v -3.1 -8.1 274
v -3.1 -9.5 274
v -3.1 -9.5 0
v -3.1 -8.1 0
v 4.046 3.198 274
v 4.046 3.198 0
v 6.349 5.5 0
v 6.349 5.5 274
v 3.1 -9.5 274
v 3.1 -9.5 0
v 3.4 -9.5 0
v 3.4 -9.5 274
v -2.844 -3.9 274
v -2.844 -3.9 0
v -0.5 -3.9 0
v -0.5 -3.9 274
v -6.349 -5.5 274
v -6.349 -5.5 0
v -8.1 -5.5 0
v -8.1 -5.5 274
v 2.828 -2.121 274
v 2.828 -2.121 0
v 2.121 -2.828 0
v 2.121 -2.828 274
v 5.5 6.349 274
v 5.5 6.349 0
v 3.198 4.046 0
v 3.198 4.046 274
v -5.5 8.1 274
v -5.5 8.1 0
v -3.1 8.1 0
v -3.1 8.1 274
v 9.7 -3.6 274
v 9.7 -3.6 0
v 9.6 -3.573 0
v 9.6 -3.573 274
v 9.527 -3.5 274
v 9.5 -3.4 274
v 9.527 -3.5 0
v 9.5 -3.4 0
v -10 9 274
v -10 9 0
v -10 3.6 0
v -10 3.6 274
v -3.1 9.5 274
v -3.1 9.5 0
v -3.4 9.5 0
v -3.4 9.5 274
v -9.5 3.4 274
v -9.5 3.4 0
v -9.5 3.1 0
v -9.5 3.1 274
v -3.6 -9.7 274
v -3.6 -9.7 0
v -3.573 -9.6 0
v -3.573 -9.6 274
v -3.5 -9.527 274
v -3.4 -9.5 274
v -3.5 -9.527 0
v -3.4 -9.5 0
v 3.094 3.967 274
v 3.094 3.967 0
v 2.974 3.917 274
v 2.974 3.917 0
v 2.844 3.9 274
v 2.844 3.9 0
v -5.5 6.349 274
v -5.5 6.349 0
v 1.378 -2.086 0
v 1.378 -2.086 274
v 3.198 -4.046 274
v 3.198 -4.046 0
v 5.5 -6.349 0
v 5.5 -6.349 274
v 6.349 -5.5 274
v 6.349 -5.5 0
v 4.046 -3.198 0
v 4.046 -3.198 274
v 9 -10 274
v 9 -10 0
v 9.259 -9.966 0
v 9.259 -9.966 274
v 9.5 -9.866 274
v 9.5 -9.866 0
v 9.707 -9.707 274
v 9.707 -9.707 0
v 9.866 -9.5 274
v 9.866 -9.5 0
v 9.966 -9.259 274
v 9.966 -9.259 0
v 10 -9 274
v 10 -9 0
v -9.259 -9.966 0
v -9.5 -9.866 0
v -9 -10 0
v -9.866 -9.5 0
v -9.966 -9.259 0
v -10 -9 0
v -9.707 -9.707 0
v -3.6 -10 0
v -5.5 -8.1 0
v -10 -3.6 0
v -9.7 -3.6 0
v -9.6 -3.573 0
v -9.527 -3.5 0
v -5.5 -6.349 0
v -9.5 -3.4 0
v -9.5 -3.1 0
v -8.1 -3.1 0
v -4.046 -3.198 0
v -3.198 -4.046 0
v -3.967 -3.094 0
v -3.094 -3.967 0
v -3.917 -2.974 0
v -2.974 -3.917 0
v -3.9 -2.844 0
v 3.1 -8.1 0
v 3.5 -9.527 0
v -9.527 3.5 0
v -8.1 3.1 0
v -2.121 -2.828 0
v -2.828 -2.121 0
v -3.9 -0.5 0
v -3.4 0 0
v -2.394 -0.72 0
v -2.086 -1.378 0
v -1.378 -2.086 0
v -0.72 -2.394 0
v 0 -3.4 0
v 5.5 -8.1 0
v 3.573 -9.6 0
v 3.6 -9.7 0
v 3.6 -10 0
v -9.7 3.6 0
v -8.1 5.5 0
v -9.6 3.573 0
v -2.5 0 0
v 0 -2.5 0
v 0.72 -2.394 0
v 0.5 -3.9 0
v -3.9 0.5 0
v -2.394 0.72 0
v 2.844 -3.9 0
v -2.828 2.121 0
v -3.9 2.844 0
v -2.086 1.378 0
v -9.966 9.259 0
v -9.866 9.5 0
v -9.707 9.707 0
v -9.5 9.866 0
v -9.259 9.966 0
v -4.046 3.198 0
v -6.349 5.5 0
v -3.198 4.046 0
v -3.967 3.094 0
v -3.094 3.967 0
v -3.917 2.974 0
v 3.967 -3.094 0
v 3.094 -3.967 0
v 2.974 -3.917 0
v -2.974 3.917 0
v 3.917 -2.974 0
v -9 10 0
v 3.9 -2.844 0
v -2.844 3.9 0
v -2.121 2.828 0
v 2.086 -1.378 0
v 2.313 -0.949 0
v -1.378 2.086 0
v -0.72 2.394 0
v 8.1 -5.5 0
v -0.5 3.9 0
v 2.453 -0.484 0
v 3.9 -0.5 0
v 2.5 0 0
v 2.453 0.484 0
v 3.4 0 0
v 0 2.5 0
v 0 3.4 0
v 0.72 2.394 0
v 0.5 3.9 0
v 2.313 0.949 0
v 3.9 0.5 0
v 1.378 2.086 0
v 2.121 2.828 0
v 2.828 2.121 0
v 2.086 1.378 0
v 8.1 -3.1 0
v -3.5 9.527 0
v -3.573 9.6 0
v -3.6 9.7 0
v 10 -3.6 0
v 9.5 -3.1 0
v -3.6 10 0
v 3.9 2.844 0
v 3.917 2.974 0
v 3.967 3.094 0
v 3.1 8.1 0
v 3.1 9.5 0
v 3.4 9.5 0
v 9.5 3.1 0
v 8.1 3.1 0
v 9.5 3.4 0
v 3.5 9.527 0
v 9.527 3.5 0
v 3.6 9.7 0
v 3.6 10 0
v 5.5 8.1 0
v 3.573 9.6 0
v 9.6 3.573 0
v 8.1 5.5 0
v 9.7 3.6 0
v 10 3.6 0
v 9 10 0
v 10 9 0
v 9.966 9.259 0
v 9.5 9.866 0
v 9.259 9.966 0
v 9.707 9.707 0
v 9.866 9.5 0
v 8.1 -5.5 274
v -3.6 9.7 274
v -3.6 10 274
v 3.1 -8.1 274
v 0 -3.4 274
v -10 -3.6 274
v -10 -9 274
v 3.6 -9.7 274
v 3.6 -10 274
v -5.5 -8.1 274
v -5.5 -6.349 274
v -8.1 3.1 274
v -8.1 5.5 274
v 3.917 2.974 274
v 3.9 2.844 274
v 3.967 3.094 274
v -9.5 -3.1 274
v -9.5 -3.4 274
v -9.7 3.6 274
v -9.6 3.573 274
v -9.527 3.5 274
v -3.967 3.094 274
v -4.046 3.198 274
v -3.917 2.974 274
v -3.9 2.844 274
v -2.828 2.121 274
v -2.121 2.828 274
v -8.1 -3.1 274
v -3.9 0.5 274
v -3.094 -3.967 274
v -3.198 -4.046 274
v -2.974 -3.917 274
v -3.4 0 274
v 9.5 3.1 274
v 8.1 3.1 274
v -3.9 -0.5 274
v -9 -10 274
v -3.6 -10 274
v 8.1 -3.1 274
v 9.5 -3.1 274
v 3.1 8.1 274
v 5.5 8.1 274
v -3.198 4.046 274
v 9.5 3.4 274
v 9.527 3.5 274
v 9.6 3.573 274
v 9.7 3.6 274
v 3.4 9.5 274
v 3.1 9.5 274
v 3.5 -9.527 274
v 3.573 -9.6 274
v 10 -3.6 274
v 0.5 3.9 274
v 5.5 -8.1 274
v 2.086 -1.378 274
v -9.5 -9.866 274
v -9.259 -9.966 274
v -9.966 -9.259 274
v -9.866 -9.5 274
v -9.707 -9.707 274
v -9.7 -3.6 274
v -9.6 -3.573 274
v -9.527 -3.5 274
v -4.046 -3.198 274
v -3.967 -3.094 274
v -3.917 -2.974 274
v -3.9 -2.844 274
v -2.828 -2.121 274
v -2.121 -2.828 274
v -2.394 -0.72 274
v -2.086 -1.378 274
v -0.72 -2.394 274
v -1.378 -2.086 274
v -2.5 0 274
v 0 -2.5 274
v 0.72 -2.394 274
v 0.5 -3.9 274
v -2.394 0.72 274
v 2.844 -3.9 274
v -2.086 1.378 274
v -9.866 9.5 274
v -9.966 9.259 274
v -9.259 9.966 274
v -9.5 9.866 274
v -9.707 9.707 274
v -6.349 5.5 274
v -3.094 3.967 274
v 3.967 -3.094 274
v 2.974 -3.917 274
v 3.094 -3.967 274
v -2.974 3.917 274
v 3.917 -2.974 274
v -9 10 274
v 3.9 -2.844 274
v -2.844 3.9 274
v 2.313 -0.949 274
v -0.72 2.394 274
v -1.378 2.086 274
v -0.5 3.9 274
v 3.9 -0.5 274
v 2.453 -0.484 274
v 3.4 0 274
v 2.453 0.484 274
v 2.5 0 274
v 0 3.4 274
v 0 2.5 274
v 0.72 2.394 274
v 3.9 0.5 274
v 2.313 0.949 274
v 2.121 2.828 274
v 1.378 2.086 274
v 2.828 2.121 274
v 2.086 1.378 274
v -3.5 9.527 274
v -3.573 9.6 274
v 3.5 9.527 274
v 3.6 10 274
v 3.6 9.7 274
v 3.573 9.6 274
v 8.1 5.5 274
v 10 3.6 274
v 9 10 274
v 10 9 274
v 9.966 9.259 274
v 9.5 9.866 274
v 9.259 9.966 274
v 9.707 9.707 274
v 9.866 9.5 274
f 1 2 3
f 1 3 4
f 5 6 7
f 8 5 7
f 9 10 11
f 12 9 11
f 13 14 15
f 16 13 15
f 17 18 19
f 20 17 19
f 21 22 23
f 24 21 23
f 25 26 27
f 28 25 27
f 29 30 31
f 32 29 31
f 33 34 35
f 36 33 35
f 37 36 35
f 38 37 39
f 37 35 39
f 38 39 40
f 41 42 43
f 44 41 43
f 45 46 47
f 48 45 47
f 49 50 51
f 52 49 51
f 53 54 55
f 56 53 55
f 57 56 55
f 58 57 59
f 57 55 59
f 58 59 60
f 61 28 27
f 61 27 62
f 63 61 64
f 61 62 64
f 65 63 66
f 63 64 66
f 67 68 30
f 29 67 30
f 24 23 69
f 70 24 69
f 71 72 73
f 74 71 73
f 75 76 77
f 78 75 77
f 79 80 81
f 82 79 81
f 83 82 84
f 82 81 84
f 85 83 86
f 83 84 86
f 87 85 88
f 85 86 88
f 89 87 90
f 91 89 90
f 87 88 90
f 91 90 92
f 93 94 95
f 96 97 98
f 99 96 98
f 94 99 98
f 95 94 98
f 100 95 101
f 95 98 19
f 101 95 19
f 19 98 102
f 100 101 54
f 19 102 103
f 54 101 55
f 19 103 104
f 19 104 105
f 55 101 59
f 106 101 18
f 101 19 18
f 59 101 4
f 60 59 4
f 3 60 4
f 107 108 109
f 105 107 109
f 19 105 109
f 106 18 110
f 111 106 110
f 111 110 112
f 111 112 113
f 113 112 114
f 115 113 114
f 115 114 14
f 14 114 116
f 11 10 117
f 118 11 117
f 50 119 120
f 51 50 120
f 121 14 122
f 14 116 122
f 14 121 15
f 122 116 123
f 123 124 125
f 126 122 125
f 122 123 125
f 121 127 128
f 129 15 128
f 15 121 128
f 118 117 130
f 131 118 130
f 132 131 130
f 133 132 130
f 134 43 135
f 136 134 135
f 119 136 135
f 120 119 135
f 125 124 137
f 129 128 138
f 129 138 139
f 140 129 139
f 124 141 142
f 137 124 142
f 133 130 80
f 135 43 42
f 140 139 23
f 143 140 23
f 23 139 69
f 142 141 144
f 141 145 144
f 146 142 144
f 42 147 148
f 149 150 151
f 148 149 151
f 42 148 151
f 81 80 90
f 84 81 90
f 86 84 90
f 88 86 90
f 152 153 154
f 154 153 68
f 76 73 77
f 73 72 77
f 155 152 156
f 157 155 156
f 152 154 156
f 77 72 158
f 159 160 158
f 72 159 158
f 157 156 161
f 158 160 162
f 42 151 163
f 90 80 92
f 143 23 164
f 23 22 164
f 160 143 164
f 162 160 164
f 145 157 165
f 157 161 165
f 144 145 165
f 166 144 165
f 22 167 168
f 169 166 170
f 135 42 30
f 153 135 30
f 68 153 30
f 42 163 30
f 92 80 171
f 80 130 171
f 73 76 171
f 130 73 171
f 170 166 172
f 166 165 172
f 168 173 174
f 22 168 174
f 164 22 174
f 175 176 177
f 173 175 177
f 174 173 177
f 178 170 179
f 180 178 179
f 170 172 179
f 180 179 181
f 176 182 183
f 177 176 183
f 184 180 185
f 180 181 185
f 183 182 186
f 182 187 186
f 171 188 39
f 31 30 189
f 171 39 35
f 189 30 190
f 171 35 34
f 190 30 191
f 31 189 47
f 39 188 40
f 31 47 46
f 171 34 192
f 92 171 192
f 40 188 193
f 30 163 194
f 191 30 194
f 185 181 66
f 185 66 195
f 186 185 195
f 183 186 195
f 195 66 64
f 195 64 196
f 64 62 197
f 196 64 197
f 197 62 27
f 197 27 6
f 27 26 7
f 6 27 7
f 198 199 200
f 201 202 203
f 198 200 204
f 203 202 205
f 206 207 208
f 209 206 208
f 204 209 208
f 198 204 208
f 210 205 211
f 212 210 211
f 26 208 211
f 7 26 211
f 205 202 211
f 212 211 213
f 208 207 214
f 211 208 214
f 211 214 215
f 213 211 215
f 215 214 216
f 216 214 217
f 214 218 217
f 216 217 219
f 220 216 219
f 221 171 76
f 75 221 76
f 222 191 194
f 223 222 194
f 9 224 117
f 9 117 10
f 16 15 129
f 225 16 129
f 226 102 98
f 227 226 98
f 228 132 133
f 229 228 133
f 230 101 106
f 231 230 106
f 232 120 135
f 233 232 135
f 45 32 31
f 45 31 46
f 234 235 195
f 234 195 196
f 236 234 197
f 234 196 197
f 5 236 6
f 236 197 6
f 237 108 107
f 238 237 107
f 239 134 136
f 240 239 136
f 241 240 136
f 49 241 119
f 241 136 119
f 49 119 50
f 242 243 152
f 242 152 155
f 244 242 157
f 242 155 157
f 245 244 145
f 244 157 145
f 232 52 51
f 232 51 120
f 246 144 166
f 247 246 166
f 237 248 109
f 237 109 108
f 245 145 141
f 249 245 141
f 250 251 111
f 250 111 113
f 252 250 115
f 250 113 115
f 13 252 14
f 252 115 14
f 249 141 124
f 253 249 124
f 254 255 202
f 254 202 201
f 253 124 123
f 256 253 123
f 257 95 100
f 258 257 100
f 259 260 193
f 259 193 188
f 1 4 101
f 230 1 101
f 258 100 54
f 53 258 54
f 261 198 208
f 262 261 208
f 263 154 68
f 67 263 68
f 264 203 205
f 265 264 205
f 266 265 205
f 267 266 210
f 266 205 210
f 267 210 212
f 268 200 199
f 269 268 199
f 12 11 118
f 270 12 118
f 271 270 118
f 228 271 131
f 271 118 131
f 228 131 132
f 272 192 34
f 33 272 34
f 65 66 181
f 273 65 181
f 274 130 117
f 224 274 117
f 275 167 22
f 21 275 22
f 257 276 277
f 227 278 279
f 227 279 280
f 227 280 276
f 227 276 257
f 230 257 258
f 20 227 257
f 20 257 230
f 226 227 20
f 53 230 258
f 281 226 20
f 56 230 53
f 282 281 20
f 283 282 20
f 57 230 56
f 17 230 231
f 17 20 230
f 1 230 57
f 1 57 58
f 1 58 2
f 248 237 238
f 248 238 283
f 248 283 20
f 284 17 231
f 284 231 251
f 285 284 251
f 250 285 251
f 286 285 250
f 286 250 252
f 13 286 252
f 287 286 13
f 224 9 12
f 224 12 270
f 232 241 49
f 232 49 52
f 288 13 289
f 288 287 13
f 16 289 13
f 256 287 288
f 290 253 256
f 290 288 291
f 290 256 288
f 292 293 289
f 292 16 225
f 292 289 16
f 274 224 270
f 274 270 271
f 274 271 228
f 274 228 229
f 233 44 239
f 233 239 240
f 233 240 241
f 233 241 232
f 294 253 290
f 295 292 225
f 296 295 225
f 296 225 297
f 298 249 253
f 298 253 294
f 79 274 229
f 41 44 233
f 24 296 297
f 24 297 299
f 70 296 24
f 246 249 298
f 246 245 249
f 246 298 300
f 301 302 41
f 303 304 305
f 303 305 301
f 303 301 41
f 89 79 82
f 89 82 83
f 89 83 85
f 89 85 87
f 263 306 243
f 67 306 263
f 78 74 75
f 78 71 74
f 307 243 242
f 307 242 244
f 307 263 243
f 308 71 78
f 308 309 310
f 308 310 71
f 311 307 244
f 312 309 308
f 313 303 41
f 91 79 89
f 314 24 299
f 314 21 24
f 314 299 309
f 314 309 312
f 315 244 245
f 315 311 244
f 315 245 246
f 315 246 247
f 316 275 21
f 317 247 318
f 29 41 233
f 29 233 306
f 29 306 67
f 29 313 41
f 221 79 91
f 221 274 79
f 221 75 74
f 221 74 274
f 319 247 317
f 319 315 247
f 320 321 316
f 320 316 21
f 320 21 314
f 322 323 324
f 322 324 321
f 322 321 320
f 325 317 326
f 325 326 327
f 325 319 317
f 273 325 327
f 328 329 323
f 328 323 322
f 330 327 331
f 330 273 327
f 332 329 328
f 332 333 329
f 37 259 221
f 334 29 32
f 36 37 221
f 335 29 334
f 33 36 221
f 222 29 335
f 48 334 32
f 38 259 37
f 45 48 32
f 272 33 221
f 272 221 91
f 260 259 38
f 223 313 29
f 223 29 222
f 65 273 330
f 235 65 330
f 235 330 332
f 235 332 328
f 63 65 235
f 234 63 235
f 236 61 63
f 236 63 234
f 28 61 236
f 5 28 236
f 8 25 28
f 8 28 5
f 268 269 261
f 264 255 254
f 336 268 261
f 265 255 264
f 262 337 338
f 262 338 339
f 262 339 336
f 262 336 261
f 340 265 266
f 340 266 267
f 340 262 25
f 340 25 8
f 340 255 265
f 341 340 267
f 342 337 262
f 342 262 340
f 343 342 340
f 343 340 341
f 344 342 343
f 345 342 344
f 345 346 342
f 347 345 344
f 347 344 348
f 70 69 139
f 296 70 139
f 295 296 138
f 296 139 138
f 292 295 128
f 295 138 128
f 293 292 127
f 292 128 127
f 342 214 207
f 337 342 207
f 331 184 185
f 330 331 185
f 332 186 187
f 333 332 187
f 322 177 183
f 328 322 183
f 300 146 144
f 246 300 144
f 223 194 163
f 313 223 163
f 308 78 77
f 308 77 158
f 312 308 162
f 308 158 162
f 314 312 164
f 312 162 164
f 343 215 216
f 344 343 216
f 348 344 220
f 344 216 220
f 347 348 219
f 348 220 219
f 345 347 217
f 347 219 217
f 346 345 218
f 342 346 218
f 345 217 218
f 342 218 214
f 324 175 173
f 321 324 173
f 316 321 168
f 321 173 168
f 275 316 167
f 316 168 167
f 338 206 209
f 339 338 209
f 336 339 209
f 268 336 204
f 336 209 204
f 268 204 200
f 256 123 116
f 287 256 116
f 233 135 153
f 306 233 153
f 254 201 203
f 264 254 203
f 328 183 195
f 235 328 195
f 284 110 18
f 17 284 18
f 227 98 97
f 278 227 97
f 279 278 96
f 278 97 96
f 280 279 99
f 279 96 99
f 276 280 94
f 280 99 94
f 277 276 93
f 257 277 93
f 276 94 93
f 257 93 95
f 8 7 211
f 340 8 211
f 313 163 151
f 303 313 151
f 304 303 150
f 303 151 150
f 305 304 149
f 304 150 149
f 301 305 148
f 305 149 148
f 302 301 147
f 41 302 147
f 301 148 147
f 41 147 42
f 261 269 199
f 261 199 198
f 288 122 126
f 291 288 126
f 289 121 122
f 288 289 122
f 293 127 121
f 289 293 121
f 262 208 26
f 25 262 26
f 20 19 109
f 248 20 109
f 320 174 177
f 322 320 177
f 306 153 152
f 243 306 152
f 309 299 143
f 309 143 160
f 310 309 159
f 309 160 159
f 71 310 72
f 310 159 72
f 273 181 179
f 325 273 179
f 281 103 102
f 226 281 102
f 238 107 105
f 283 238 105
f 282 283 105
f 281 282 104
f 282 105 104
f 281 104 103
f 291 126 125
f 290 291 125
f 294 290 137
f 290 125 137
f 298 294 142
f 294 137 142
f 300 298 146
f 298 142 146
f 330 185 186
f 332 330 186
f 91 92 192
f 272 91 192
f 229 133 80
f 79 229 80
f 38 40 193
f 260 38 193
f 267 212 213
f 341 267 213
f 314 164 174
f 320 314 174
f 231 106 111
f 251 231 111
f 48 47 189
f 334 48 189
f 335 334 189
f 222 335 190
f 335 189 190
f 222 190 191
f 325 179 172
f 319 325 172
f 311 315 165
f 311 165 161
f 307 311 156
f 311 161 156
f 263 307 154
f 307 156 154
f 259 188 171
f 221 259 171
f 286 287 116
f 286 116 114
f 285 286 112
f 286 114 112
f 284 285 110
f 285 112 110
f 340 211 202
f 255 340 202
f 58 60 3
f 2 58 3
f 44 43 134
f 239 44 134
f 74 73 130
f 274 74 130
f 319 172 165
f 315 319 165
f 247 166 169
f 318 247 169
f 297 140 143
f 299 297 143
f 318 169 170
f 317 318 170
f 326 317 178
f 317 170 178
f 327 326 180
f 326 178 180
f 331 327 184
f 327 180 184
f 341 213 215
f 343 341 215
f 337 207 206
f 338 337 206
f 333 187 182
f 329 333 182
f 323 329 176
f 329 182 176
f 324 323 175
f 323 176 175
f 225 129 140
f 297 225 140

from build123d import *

# Parameters (mm, degrees)
EXTRUDE1_DEPTH = 274


with BuildPart() as part:
    # Sketch1 → Extrude1 (new body)
    with BuildSketch(Plane.XY):
        with BuildLine():
            Line((0, 3.4), (-0.5, 3.9))
            Line((-0.5, 3.9), (-2.844365081, 3.9))
            ThreePointArc((-2.844365081, 3.9), (-3.035706798, 3.938060234), (-3.197918472, 4.046446609))
            Line((-3.197918472, 4.046446609), (-5.5, 6.348528137))
            Line((-5.5, 6.348528137), (-5.5, 8.1))
            Line((-5.5, 8.1), (-3.1, 8.1))
            Line((-3.1, 8.1), (-3.1, 9.5))
            Line((-3.1, 9.5), (-3.4, 9.5))
            ThreePointArc((-3.4, 9.5), (-3.541421356, 9.558578644), (-3.6, 9.7))
            Line((-3.6, 9.7), (-3.6, 10))
            Line((-3.6, 10), (-9, 10))
            ThreePointArc((-9, 10), (-9.707106781, 9.707106781), (-10, 9))
            Line((-10, 9), (-10, 3.6))
            Line((-10, 3.6), (-9.7, 3.6))
            ThreePointArc((-9.7, 3.6), (-9.558578644, 3.541421356), (-9.5, 3.4))
            Line((-9.5, 3.4), (-9.5, 3.1))
            Line((-9.5, 3.1), (-8.1, 3.1))
            Line((-8.1, 3.1), (-8.1, 5.5))
            Line((-8.1, 5.5), (-6.348528137, 5.5))
            Line((-6.348528137, 5.5), (-4.046446609, 3.197918472))
            ThreePointArc((-4.046446609, 3.197918472), (-3.938060234, 3.035706798), (-3.9, 2.844365081))
            Line((-3.9, 2.844365081), (-3.9, 0.5))
            Line((-3.9, 0.5), (-3.4, 0))
            Line((-3.4, 0), (-3.9, -0.5))
            Line((-3.9, -0.5), (-3.9, -2.844365081))
            ThreePointArc((-3.9, -2.844365081), (-3.938060234, -3.035706798), (-4.046446609, -3.197918472))
            Line((-4.046446609, -3.197918472), (-6.348528137, -5.5))
            Line((-6.348528137, -5.5), (-8.1, -5.5))
            Line((-8.1, -5.5), (-8.1, -3.1))
            Line((-8.1, -3.1), (-9.5, -3.1))
            Line((-9.5, -3.1), (-9.5, -3.4))
            ThreePointArc((-9.5, -3.4), (-9.558578644, -3.541421356), (-9.7, -3.6))
            Line((-9.7, -3.6), (-10, -3.6))
            Line((-10, -3.6), (-10, -9))
            ThreePointArc((-10, -9), (-9.707106781, -9.707106781), (-9, -10))
            Line((-9, -10), (-3.6, -10))
            Line((-3.6, -10), (-3.6, -9.7))
            ThreePointArc((-3.6, -9.7), (-3.541421356, -9.558578644), (-3.4, -9.5))
            Line((-3.4, -9.5), (-3.1, -9.5))
            Line((-3.1, -9.5), (-3.1, -8.1))
            Line((-3.1, -8.1), (-5.5, -8.1))
            Line((-5.5, -8.1), (-5.5, -6.348528137))
            Line((-5.5, -6.348528137), (-3.197918472, -4.046446609))
            ThreePointArc((-3.197918472, -4.046446609), (-3.035706798, -3.938060234), (-2.844365081, -3.9))
            Line((-2.844365081, -3.9), (-0.5, -3.9))
            Line((-0.5, -3.9), (0, -3.4))
            Line((0, -3.4), (0.5, -3.9))
            Line((0.5, -3.9), (2.844365081, -3.9))
            ThreePointArc((2.844365081, -3.9), (3.035706798, -3.938060234), (3.197918472, -4.046446609))
            Line((3.197918472, -4.046446609), (5.5, -6.348528137))
            Line((5.5, -6.348528137), (5.5, -8.1))
            Line((5.5, -8.1), (3.1, -8.1))
            Line((3.1, -8.1), (3.1, -9.5))
            Line((3.1, -9.5), (3.4, -9.5))
            ThreePointArc((3.4, -9.5), (3.541421356, -9.558578644), (3.6, -9.7))
            Line((3.6, -9.7), (3.6, -10))
            Line((3.6, -10), (9, -10))
            ThreePointArc((9, -10), (9.707106781, -9.707106781), (10, -9))
            Line((10, -9), (10, -3.6))
            Line((10, -3.6), (9.7, -3.6))
            ThreePointArc((9.7, -3.6), (9.558578644, -3.541421356), (9.5, -3.4))
            Line((9.5, -3.4), (9.5, -3.1))
            Line((9.5, -3.1), (8.1, -3.1))
            Line((8.1, -3.1), (8.1, -5.5))
            Line((8.1, -5.5), (6.348528137, -5.5))
            Line((6.348528137, -5.5), (4.046446609, -3.197918472))
            ThreePointArc((4.046446609, -3.197918472), (3.938060234, -3.035706798), (3.9, -2.844365081))
            Line((3.9, -2.844365081), (3.9, -0.5))
            Line((3.9, -0.5), (3.4, 0))
            Line((3.4, 0), (3.9, 0.5))
            Line((3.9, 0.5), (3.9, 2.844365081))
            ThreePointArc((3.9, 2.844365081), (3.938060234, 3.035706798), (4.046446609, 3.197918472))
            Line((4.046446609, 3.197918472), (6.348528137, 5.5))
            Line((6.348528137, 5.5), (8.1, 5.5))
            Line((8.1, 5.5), (8.1, 3.1))
            Line((8.1, 3.1), (9.5, 3.1))
            Line((9.5, 3.1), (9.5, 3.4))
            ThreePointArc((9.5, 3.4), (9.558578644, 3.541421356), (9.7, 3.6))
            Line((9.7, 3.6), (10, 3.6))
            Line((10, 3.6), (10, 9))
            ThreePointArc((10, 9), (9.707106781, 9.707106781), (9, 10))
            Line((9, 10), (3.6, 10))
            Line((3.6, 10), (3.6, 9.7))
            ThreePointArc((3.6, 9.7), (3.541421356, 9.558578644), (3.4, 9.5))
            Line((3.4, 9.5), (3.1, 9.5))
            Line((3.1, 9.5), (3.1, 8.1))
            Line((3.1, 8.1), (5.5, 8.1))
            Line((5.5, 8.1), (5.5, 6.348528137))
            Line((5.5, 6.348528137), (3.197918472, 4.046446609))
            ThreePointArc((3.197918472, 4.046446609), (3.035706798, 3.938060234), (2.844365081, 3.9))
            Line((2.844365081, 3.9), (0.5, 3.9))
            Line((0.5, 3.9), (0, 3.4))
        make_face()
        with BuildLine():
            ThreePointArc((2.5, 0), (2.394160656, -0.719718523), (2.085604198, -1.378497417))
            Line((2.085604198, -1.378497417), (2.828427125, -2.121320344))
            Line((2.828427125, -2.121320344), (2.121320344, -2.828427125))
            Line((2.121320344, -2.828427125), (1.378497417, -2.085604198))
            ThreePointArc((1.378497417, -2.085604198), (0, -2.5), (-1.378497417, -2.085604198))
            Line((-1.378497417, -2.085604198), (-2.121320344, -2.828427125))
            Line((-2.121320344, -2.828427125), (-2.828427125, -2.121320344))
            Line((-2.828427125, -2.121320344), (-2.085604198, -1.378497417))
            ThreePointArc((-2.085604198, -1.378497417), (-2.5, 0), (-2.085604198, 1.378497417))
            Line((-2.085604198, 1.378497417), (-2.828427125, 2.121320344))
            Line((-2.828427125, 2.121320344), (-2.121320344, 2.828427125))
            Line((-2.121320344, 2.828427125), (-1.378497417, 2.085604198))
            ThreePointArc((-1.378497417, 2.085604198), (0, 2.5), (1.378497417, 2.085604198))
            Line((1.378497417, 2.085604198), (2.121320344, 2.828427125))
            Line((2.121320344, 2.828427125), (2.828427125, 2.121320344))
            Line((2.828427125, 2.121320344), (2.085604198, 1.378497417))
            ThreePointArc((2.085604198, 1.378497417), (2.394160656, 0.719718523), (2.5, 0))
        make_face(mode=Mode.SUBTRACT)
    extrude(amount=EXTRUDE1_DEPTH)


solid = part.part
